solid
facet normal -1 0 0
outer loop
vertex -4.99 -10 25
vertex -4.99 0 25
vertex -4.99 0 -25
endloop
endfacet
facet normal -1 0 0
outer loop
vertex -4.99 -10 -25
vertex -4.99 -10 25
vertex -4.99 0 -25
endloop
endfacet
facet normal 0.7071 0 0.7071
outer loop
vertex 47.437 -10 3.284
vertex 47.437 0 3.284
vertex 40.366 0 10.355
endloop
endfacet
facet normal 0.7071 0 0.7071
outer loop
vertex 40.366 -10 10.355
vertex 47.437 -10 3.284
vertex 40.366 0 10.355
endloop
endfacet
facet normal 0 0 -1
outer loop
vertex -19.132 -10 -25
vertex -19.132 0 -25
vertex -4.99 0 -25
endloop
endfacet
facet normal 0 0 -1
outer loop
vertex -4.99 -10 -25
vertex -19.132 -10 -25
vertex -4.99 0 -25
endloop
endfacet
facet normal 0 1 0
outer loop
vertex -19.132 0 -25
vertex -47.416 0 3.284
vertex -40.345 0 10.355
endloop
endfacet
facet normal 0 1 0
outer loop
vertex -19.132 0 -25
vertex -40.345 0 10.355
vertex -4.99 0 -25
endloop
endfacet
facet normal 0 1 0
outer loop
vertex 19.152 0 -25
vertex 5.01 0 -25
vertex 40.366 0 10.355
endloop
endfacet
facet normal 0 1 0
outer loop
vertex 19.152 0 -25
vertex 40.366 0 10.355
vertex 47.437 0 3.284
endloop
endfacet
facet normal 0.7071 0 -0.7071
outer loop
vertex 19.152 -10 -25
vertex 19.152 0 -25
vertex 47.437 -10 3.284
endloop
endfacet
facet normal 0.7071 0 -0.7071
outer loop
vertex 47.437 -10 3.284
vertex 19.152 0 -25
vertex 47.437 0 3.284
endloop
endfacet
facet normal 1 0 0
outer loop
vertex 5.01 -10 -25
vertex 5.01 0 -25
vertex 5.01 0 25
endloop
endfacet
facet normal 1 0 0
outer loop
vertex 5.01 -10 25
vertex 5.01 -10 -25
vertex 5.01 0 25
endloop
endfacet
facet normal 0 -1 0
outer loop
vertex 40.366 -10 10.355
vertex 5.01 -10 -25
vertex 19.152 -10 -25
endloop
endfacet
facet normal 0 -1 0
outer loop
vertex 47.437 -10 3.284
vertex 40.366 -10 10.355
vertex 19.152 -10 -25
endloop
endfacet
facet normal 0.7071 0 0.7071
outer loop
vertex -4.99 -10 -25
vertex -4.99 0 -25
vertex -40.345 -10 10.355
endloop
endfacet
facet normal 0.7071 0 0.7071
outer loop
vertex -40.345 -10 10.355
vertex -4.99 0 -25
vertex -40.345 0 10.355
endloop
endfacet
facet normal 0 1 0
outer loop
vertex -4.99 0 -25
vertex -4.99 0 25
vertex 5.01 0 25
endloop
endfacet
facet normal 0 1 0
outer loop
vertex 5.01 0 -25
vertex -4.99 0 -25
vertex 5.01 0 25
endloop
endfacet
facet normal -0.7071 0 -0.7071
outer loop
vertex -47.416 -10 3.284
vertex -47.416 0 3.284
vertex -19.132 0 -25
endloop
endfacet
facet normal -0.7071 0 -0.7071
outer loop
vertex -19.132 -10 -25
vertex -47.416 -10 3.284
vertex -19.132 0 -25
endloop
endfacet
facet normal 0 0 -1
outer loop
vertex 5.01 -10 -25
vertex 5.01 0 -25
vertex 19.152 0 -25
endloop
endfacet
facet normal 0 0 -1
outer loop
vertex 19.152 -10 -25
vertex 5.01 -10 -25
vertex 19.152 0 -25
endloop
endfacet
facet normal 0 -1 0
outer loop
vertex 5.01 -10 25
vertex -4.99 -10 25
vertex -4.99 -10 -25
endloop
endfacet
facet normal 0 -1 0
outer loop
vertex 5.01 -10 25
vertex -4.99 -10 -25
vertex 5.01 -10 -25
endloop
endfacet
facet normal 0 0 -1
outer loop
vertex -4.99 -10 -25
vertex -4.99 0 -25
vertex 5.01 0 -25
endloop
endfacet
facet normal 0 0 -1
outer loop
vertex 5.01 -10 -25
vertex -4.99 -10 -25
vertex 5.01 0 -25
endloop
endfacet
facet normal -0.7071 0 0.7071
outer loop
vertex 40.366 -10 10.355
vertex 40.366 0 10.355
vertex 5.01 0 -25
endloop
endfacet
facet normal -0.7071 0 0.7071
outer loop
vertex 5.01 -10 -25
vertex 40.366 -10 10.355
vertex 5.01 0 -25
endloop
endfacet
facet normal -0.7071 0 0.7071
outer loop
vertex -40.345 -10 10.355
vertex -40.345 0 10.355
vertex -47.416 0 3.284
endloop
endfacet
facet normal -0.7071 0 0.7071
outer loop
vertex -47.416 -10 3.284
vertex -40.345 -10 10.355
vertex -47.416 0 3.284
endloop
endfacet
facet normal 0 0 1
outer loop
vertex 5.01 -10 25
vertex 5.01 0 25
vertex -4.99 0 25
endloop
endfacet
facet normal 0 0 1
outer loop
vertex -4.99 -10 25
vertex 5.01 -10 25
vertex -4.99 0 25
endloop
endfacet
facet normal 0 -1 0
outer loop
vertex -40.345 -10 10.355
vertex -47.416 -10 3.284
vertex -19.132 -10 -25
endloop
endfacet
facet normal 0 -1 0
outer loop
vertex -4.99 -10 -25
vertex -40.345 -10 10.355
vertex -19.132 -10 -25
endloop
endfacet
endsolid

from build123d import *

# Parameters (mm, degrees)
F1_DEPTH = 10
F4_R     = 2
F6_DEPTH = 42.76


# Not quite as in the source:
# - the program builds the solid bodies; features that only make, move or delete a surface that nothing else refers to are left out


with BuildPart() as f1:
    # F0 (on Front) → F1 (new body)
    with BuildSketch(Plane.XZ):
        Polygon((40.3655851163, 10.3553390593), (5.010246057, -25), (19.1523816807, -25), (47.4366529281, 3.2842712475), align=None)
    extrude(amount=F1_DEPTH)

    # F4 (on face) → F6 (join)
    with BuildSketch(Plane(origin=(25.3604620878, 0, 25.3604620878), x_dir=(0.7071067812, 0, -0.7071067812), z_dir=(0.7071067812, 0, 0.7071067812))):
        with Locations((25.838650763, -5)):
            Circle(F4_R)
    extrude(amount=-F6_DEPTH)


with BuildPart() as f1b:
    # F0 (on Front) → F1, piece 2 (new body)
    with BuildSketch(Plane.XZ):
        Polygon((0.010246057, -25), (5.010246057, -25), (5.010246057, 25), (-4.989753943, 25), (-4.989753943, -25), align=None)
    extrude(amount=F1_DEPTH)


with BuildPart() as f1c:
    # F0 (on Front) → F1, piece 3 (new body)
    with BuildSketch(Plane.XZ):
        Polygon((-19.1318895668, -25), (-4.989753943, -25), (-40.3450930024, 10.3553390593), (-47.4161608142, 3.2842712475), align=None)
    extrude(amount=F1_DEPTH)


solid = Compound([f1.part, f1b.part, f1c.part])
